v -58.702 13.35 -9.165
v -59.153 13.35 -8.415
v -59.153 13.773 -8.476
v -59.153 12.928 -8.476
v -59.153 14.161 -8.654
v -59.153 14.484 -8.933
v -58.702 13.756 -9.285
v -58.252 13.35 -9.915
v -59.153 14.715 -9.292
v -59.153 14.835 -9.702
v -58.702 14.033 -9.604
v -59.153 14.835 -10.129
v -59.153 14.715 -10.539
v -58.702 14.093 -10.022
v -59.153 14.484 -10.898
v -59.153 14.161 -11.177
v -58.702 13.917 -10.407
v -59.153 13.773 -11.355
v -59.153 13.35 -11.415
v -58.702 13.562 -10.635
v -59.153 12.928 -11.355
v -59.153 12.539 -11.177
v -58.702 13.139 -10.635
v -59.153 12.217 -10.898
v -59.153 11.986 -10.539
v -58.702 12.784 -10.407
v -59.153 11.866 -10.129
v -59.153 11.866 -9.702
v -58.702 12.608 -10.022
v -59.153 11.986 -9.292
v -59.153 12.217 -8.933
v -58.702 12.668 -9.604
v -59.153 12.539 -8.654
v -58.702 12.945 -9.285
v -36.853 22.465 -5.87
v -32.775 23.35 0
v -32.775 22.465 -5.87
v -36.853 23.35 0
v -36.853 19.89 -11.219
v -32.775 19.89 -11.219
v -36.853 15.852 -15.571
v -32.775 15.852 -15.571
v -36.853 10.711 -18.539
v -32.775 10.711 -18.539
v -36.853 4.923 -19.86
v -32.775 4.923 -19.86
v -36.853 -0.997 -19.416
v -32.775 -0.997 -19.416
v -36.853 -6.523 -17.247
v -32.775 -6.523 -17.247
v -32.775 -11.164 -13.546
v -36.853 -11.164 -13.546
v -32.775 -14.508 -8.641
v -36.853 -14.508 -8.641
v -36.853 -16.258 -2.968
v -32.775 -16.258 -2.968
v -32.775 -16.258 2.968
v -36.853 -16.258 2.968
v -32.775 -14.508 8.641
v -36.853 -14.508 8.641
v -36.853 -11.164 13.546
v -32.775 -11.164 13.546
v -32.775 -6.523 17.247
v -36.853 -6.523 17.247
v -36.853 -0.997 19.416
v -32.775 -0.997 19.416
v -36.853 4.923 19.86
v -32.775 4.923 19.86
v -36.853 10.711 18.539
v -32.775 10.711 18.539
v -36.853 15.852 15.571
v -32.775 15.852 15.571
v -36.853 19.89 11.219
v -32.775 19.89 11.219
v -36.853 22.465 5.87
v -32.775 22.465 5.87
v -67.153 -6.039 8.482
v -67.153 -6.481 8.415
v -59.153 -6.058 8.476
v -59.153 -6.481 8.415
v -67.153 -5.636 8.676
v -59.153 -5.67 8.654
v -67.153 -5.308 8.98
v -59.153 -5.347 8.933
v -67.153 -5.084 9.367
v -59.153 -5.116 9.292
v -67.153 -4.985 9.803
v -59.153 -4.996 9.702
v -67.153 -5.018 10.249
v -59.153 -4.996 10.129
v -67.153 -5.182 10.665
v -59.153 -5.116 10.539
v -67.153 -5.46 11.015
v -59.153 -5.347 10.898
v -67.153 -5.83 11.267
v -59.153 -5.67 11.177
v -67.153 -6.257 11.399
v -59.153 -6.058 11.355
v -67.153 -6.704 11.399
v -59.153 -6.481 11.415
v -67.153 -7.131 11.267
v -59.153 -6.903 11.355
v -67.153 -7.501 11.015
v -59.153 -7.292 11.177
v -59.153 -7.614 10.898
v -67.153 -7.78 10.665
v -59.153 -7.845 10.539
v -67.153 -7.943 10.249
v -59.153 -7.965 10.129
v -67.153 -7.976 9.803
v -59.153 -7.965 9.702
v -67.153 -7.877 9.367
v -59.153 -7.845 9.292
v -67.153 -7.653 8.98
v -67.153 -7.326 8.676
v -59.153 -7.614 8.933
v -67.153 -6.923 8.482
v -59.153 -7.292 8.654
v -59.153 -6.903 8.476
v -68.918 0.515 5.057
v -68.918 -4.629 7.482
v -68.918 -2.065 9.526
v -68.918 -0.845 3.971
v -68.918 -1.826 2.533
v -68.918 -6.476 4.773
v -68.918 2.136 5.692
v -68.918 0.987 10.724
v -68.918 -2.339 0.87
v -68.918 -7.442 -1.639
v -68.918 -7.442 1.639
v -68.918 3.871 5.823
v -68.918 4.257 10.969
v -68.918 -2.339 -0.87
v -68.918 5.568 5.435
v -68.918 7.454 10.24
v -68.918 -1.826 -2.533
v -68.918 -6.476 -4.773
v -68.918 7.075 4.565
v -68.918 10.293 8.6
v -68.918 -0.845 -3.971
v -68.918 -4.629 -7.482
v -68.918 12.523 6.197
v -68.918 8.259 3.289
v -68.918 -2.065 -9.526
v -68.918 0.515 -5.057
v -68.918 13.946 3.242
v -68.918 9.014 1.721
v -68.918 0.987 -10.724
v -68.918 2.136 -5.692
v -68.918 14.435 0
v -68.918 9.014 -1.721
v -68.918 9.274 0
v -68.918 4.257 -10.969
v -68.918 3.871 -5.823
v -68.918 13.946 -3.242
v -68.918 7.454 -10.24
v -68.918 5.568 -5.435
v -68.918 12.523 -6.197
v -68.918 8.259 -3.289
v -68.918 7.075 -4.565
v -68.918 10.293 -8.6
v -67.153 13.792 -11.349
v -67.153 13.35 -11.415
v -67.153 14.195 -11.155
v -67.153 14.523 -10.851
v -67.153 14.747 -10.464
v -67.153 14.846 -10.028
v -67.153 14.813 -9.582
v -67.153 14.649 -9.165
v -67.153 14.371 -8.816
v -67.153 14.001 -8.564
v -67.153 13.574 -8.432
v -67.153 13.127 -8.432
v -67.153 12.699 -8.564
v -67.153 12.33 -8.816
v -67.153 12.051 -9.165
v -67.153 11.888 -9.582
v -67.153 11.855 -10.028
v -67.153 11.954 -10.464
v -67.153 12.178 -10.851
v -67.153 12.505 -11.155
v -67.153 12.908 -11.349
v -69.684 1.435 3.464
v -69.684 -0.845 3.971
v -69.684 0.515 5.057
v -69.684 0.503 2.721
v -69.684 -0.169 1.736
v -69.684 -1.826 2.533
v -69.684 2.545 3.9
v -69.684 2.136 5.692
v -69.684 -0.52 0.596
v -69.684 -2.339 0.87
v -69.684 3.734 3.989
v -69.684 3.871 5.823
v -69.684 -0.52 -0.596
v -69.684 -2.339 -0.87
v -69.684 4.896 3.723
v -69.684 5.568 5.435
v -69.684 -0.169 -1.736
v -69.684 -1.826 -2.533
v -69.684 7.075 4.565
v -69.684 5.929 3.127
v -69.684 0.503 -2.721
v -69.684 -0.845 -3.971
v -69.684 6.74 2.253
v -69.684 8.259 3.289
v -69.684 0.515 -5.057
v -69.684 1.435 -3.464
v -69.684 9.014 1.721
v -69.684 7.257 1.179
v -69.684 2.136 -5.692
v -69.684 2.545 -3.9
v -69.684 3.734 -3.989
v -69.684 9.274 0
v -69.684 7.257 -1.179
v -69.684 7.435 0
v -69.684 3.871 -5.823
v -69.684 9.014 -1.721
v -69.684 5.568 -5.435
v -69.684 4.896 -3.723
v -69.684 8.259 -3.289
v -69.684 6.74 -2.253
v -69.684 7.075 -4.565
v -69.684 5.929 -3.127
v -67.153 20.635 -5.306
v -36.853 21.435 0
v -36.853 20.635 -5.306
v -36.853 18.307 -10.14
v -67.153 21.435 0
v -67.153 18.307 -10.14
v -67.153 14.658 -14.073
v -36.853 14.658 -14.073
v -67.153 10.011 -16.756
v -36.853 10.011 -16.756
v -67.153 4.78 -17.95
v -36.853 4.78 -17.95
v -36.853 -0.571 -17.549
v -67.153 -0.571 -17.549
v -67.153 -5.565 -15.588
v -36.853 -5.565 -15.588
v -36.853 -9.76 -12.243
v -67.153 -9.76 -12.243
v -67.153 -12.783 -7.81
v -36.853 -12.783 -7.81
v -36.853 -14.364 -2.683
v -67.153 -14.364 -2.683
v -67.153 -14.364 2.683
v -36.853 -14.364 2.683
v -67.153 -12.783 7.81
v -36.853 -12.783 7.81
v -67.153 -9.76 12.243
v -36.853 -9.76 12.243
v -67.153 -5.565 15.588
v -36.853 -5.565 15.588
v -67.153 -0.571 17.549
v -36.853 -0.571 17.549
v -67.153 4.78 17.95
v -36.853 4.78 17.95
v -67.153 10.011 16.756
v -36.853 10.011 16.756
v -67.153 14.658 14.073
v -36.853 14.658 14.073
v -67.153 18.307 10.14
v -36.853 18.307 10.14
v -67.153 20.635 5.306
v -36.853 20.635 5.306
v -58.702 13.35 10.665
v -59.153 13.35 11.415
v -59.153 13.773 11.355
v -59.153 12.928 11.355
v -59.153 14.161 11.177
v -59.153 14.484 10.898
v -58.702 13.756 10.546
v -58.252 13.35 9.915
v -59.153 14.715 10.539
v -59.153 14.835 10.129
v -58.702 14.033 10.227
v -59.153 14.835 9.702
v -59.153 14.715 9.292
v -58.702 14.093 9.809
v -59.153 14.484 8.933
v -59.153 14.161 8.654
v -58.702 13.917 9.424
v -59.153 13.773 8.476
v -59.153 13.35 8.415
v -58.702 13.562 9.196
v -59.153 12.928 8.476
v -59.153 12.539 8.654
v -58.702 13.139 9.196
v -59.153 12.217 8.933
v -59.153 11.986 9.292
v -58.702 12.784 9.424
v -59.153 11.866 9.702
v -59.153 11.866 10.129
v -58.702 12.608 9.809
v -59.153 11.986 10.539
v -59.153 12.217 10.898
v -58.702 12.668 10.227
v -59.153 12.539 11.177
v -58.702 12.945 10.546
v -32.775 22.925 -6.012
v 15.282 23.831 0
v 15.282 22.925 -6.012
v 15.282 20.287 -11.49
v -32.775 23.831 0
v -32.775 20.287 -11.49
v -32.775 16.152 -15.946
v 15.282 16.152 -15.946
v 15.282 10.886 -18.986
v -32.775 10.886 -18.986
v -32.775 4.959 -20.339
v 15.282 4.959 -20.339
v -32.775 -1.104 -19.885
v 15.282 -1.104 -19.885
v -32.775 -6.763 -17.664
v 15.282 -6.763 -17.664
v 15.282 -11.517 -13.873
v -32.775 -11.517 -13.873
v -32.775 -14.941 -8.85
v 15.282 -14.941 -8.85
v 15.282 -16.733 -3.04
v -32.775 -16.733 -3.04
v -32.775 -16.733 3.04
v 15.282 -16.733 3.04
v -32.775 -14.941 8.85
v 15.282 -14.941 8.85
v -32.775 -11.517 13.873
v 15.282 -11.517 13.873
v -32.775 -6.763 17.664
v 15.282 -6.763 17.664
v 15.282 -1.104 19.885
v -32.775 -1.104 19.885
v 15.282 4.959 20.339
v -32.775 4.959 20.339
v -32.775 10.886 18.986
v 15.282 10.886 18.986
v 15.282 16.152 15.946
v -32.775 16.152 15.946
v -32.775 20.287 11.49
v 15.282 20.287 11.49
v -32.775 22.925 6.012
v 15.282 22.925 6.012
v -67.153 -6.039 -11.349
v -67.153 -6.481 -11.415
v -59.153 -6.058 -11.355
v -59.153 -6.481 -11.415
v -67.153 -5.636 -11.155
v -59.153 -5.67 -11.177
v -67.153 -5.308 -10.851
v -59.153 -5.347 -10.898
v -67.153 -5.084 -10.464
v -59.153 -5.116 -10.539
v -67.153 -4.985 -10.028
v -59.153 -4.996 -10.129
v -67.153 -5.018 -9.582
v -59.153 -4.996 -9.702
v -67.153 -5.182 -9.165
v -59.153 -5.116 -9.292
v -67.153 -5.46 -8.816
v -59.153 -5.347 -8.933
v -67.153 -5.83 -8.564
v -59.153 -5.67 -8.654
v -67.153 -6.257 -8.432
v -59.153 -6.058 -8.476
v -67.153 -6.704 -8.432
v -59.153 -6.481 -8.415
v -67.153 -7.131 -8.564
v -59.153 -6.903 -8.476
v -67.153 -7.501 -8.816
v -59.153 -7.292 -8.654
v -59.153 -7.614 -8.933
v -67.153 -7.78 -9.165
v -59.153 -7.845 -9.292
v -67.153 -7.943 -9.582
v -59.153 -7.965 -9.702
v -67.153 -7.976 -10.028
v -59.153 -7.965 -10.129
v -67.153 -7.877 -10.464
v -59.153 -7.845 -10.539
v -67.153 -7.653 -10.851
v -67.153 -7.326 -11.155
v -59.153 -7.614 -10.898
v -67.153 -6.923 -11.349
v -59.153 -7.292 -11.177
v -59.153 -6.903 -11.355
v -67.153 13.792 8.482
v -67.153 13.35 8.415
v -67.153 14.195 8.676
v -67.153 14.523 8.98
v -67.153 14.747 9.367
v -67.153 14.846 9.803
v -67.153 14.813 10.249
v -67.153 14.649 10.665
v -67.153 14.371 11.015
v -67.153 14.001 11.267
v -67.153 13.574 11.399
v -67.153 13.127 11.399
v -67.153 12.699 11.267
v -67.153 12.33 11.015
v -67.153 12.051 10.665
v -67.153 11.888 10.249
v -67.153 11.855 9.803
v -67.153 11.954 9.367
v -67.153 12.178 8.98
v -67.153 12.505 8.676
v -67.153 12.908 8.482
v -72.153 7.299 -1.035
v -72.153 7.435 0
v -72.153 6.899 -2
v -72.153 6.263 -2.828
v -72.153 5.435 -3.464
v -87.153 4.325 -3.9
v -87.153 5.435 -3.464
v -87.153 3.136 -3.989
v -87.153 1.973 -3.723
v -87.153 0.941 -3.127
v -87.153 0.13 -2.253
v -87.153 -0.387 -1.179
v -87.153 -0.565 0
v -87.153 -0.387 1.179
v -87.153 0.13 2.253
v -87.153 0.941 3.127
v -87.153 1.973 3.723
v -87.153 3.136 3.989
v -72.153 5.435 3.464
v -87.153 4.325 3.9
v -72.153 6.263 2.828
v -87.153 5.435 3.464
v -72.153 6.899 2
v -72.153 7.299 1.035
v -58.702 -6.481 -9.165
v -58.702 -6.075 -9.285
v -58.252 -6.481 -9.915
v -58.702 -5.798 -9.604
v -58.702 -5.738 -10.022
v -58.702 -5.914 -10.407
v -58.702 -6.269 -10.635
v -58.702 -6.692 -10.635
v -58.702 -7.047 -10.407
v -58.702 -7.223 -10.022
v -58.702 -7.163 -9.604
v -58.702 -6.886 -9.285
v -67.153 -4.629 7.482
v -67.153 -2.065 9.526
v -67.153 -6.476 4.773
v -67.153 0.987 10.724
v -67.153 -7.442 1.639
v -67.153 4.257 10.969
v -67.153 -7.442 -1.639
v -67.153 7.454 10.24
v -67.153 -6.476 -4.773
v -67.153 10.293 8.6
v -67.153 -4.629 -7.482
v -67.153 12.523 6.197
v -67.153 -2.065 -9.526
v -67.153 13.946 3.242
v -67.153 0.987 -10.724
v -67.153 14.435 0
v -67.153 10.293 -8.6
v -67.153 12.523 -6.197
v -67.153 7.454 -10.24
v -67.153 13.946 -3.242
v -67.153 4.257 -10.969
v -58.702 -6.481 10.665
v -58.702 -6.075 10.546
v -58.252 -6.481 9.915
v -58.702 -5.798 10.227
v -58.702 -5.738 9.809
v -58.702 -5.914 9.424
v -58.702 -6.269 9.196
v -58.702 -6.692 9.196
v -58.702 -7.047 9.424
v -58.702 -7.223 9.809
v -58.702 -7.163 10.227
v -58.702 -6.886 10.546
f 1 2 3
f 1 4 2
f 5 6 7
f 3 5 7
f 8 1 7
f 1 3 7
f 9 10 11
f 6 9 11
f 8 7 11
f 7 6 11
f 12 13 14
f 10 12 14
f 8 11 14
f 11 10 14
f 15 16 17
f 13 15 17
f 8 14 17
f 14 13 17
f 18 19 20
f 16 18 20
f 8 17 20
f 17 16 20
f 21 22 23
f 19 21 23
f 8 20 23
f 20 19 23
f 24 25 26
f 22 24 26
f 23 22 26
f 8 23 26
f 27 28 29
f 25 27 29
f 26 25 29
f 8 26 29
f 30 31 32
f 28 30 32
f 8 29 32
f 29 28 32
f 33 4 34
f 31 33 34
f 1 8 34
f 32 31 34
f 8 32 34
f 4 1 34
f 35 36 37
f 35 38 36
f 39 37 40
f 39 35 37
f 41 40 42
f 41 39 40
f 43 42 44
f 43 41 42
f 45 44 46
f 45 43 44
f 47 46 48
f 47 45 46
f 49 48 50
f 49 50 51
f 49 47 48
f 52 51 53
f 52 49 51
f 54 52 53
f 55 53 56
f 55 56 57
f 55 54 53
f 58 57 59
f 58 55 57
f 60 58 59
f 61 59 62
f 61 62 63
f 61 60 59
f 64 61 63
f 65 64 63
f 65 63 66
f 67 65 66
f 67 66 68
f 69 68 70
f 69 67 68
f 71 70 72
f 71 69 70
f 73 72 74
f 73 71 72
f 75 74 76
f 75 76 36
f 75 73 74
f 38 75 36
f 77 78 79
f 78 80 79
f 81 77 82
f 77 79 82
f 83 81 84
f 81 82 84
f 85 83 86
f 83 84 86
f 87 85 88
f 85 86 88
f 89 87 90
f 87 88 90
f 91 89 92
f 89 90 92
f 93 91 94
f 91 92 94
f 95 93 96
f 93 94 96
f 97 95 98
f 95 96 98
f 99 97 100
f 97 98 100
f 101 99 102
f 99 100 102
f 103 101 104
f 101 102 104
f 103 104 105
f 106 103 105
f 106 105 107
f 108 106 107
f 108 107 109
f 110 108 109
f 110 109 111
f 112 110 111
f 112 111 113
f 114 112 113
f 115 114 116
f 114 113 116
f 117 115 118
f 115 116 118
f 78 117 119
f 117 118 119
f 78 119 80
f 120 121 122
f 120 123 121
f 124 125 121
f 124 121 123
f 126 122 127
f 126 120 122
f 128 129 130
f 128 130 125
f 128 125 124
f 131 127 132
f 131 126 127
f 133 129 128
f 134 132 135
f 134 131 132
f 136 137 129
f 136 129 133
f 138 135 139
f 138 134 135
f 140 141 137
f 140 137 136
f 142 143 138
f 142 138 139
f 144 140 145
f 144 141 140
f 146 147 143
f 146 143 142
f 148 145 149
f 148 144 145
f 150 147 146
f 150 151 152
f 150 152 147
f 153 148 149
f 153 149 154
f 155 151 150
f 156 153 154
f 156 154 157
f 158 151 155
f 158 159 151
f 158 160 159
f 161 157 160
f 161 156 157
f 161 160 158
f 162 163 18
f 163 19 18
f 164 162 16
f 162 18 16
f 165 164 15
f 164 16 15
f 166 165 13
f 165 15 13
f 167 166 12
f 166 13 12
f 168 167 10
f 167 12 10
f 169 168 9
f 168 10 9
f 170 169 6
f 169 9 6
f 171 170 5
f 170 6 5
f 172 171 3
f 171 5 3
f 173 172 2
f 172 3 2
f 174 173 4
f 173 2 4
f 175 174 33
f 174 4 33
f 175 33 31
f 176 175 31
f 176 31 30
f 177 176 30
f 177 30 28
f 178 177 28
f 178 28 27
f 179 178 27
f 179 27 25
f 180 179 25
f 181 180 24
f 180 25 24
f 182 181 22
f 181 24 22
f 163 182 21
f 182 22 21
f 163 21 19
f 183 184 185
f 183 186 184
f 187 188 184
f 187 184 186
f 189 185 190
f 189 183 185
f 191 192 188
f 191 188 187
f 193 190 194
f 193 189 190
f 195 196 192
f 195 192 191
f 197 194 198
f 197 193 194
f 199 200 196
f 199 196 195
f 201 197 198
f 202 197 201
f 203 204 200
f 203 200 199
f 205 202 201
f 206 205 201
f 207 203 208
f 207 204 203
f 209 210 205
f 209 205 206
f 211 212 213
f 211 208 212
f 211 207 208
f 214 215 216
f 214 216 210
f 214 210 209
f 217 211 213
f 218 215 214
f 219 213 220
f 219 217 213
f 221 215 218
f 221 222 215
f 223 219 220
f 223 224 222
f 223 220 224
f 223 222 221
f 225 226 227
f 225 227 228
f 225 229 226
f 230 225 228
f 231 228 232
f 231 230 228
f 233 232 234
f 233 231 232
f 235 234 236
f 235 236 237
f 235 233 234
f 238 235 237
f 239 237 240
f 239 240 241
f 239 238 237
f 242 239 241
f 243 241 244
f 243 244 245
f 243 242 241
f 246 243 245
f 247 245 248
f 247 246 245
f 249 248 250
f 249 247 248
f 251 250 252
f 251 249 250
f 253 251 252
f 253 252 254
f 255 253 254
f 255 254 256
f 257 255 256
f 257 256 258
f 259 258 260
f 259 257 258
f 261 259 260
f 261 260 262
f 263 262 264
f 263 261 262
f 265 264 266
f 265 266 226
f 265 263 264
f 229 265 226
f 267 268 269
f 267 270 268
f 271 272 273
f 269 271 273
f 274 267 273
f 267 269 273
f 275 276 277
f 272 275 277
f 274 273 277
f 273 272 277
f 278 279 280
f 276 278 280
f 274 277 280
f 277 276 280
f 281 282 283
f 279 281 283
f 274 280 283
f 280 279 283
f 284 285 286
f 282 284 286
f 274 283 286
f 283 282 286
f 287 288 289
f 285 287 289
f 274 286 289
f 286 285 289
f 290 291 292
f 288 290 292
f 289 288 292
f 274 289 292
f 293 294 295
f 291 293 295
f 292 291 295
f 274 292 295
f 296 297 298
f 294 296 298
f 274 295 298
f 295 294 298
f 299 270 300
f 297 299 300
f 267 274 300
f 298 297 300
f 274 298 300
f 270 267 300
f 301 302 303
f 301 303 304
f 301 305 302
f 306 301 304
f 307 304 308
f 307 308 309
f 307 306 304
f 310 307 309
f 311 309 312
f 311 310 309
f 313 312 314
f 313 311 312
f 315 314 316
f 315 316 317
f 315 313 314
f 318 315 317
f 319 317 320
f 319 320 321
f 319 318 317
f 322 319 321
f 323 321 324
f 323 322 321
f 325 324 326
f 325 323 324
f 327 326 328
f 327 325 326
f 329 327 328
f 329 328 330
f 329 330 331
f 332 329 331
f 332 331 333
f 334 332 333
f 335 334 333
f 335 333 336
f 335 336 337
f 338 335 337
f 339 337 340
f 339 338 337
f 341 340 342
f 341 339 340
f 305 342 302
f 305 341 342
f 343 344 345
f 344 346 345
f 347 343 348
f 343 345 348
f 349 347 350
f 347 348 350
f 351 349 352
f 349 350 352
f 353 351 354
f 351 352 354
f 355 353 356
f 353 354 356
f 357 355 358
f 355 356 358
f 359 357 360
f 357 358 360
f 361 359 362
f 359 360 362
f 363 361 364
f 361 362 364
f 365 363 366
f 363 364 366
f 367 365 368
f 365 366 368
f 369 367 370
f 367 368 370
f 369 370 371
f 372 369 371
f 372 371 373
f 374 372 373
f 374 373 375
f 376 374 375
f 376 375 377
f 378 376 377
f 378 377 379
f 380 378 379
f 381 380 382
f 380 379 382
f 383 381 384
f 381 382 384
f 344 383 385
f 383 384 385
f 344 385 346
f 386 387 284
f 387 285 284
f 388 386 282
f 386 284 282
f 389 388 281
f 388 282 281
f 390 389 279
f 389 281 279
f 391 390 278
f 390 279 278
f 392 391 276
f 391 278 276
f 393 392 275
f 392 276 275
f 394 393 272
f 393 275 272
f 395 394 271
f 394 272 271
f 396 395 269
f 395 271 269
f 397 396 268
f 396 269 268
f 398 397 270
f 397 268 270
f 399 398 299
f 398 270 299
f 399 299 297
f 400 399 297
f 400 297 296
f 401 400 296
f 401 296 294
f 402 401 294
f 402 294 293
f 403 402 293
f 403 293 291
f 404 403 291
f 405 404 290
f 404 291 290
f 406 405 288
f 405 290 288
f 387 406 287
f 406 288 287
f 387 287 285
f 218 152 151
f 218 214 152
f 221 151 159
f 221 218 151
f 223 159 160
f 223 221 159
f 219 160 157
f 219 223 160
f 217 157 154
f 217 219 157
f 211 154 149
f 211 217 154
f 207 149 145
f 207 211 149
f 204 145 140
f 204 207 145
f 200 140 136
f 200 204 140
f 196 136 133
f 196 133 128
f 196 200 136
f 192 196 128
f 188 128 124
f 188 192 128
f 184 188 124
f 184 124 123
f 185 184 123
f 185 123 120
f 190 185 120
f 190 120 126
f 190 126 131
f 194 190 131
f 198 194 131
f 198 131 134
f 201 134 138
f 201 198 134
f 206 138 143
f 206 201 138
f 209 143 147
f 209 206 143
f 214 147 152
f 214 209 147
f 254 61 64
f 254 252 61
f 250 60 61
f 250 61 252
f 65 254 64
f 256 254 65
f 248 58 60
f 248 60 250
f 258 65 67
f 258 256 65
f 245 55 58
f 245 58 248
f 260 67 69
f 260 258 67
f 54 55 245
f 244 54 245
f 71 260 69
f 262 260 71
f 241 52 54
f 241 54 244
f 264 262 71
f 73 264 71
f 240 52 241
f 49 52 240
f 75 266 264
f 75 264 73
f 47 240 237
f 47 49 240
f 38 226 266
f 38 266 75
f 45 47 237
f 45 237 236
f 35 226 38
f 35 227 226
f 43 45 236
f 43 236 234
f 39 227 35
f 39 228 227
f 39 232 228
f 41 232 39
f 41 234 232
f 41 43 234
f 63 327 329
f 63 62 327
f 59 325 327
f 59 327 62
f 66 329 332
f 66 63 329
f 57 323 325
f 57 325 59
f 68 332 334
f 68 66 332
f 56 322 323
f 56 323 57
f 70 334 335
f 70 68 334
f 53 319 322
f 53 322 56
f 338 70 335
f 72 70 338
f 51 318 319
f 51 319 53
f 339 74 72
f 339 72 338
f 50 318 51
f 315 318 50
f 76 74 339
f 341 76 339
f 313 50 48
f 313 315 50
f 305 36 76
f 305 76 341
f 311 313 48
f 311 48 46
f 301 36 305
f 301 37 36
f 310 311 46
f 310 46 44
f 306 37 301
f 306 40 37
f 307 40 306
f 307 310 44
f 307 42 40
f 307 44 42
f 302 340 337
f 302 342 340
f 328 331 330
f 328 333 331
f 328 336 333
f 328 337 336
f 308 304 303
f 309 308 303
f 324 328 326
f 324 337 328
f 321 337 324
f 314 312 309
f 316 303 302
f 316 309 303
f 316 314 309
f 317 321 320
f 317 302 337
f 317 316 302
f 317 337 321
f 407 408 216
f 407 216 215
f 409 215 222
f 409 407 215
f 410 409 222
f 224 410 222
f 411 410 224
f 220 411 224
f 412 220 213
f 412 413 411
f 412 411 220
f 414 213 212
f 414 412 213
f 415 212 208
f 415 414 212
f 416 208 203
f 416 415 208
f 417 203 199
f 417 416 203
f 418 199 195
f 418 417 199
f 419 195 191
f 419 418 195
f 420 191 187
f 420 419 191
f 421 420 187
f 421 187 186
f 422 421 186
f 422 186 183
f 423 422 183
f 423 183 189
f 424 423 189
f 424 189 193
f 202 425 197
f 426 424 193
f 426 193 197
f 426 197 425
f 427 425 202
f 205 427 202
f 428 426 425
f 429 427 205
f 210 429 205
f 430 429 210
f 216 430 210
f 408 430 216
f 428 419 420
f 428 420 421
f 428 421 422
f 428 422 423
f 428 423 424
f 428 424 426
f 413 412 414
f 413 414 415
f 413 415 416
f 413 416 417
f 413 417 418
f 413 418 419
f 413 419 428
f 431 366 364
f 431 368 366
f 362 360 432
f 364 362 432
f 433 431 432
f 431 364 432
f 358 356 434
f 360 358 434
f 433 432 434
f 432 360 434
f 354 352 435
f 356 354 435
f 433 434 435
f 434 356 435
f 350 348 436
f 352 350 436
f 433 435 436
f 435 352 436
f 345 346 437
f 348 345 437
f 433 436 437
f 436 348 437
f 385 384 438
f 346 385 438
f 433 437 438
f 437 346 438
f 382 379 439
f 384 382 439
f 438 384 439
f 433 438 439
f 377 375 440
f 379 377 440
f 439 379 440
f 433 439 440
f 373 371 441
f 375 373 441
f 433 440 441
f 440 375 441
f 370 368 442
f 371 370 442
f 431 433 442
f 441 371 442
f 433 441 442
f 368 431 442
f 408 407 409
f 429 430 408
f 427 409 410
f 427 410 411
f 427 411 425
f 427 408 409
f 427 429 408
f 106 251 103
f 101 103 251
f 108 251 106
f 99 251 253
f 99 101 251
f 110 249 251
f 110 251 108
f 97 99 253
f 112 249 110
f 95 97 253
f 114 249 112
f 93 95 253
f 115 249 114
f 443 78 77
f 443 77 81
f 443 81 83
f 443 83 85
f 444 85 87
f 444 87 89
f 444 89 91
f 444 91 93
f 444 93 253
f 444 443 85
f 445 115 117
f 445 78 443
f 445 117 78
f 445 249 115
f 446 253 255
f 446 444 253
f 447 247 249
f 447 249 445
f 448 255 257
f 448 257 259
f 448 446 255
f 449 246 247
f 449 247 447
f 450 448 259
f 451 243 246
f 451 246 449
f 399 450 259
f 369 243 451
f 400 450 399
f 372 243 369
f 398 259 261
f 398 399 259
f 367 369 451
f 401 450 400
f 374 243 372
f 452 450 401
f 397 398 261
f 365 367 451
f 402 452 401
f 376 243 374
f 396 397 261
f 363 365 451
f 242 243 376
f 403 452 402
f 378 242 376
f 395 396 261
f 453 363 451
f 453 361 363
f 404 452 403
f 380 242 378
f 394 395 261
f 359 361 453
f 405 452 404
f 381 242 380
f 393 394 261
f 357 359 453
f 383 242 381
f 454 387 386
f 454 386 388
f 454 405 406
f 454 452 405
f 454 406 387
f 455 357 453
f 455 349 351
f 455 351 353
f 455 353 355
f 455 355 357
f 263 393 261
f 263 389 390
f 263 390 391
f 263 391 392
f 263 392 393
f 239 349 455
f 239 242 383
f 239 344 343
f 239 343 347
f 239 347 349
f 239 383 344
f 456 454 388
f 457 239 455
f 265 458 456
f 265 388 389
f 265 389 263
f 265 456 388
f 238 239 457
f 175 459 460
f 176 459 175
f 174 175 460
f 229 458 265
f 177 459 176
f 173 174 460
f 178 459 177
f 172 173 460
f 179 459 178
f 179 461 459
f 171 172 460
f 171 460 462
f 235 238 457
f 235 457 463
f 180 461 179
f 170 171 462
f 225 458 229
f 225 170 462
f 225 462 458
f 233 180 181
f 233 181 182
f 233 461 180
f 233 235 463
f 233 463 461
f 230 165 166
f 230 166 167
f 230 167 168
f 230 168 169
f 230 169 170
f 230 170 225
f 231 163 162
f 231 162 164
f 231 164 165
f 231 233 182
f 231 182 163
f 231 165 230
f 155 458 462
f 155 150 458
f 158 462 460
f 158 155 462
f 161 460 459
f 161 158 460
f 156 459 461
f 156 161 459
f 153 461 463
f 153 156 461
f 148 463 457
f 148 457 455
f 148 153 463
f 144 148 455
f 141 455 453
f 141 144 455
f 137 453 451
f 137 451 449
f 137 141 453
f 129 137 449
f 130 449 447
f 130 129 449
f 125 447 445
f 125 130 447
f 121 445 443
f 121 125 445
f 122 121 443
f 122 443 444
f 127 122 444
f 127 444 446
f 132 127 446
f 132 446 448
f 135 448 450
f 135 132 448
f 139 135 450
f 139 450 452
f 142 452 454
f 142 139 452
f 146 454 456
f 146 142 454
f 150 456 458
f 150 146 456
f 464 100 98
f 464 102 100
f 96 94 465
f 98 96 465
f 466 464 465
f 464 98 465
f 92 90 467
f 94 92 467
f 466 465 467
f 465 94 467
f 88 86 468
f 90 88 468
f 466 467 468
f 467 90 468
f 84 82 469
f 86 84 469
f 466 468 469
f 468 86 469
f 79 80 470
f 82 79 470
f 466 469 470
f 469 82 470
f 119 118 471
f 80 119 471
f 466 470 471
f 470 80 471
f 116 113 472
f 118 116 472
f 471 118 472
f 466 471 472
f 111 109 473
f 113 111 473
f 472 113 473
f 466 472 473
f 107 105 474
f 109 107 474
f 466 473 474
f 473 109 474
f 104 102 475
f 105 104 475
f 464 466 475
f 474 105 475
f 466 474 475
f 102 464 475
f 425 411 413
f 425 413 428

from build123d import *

# Parameters (mm, degrees)
FORO_3_0_3_2_D           = 3
FORO_3_0_3_2_DEPTH       = 8
FORO_3_0_3_2_TIP         = 0.901290929
SCHIZZO6_W               = 14.665621526
SCHIZZO6_H               = 2.346880268
TAGLIO_ESTRUSIONE1_DEPTH = 15


with BuildPart() as part:
    # Schizzo1 → Rivoluzione1 (revolve)
    with BuildSketch(Plane.XY):
        Polygon((15.282220449, 23.830923985), (-32.775254634, 23.830923985), (-32.775254634, 23.35027231), (-36.85329536, 23.35027231), (-36.85329536, 21.434825278), (-67.152934439, 21.434825278), (-67.152934439, 14.434825278), (-68.917878687, 14.434825278), (-68.917878687, 9.273654429), (-69.6840575, 9.273654429), (-69.6840575, 7.434825278), (-87.152934439, 7.434825278), (-87.152934439, 3.434825278), (15.282220449, 3.434825278), align=None)
    revolve(axis=Axis((15.282220449, 3.434825278, 0), (-1, 0, 0)))

    # Foro Ø3.0 (3)-2
    with Locations(Plane.ZY.offset(67.152934439)):
        with Locations((-9.915498688, 13.350323965), (9.915498688, 13.350323965), (9.915498688, -6.48067341), (-9.915498688, -6.48067341)):
            Hole(FORO_3_0_3_2_D / 2, depth=FORO_3_0_3_2_DEPTH)
            with Locations((0, 0, -(FORO_3_0_3_2_DEPTH + FORO_3_0_3_2_TIP / 2))):  # 118° drill point
                Cone(0, FORO_3_0_3_2_D / 2, FORO_3_0_3_2_TIP, mode=Mode.SUBTRACT)

    # Schizzo6 → Taglio-Estrusione1 (cut)
    with BuildSketch(Plane.ZY.offset(87.152934439)):
        with Locations((0.422032274, 6.608265412)):
            Rectangle(SCHIZZO6_W, SCHIZZO6_H)
    extrude(amount=-TAGLIO_ESTRUSIONE1_DEPTH, mode=Mode.SUBTRACT)


solid = part.part
